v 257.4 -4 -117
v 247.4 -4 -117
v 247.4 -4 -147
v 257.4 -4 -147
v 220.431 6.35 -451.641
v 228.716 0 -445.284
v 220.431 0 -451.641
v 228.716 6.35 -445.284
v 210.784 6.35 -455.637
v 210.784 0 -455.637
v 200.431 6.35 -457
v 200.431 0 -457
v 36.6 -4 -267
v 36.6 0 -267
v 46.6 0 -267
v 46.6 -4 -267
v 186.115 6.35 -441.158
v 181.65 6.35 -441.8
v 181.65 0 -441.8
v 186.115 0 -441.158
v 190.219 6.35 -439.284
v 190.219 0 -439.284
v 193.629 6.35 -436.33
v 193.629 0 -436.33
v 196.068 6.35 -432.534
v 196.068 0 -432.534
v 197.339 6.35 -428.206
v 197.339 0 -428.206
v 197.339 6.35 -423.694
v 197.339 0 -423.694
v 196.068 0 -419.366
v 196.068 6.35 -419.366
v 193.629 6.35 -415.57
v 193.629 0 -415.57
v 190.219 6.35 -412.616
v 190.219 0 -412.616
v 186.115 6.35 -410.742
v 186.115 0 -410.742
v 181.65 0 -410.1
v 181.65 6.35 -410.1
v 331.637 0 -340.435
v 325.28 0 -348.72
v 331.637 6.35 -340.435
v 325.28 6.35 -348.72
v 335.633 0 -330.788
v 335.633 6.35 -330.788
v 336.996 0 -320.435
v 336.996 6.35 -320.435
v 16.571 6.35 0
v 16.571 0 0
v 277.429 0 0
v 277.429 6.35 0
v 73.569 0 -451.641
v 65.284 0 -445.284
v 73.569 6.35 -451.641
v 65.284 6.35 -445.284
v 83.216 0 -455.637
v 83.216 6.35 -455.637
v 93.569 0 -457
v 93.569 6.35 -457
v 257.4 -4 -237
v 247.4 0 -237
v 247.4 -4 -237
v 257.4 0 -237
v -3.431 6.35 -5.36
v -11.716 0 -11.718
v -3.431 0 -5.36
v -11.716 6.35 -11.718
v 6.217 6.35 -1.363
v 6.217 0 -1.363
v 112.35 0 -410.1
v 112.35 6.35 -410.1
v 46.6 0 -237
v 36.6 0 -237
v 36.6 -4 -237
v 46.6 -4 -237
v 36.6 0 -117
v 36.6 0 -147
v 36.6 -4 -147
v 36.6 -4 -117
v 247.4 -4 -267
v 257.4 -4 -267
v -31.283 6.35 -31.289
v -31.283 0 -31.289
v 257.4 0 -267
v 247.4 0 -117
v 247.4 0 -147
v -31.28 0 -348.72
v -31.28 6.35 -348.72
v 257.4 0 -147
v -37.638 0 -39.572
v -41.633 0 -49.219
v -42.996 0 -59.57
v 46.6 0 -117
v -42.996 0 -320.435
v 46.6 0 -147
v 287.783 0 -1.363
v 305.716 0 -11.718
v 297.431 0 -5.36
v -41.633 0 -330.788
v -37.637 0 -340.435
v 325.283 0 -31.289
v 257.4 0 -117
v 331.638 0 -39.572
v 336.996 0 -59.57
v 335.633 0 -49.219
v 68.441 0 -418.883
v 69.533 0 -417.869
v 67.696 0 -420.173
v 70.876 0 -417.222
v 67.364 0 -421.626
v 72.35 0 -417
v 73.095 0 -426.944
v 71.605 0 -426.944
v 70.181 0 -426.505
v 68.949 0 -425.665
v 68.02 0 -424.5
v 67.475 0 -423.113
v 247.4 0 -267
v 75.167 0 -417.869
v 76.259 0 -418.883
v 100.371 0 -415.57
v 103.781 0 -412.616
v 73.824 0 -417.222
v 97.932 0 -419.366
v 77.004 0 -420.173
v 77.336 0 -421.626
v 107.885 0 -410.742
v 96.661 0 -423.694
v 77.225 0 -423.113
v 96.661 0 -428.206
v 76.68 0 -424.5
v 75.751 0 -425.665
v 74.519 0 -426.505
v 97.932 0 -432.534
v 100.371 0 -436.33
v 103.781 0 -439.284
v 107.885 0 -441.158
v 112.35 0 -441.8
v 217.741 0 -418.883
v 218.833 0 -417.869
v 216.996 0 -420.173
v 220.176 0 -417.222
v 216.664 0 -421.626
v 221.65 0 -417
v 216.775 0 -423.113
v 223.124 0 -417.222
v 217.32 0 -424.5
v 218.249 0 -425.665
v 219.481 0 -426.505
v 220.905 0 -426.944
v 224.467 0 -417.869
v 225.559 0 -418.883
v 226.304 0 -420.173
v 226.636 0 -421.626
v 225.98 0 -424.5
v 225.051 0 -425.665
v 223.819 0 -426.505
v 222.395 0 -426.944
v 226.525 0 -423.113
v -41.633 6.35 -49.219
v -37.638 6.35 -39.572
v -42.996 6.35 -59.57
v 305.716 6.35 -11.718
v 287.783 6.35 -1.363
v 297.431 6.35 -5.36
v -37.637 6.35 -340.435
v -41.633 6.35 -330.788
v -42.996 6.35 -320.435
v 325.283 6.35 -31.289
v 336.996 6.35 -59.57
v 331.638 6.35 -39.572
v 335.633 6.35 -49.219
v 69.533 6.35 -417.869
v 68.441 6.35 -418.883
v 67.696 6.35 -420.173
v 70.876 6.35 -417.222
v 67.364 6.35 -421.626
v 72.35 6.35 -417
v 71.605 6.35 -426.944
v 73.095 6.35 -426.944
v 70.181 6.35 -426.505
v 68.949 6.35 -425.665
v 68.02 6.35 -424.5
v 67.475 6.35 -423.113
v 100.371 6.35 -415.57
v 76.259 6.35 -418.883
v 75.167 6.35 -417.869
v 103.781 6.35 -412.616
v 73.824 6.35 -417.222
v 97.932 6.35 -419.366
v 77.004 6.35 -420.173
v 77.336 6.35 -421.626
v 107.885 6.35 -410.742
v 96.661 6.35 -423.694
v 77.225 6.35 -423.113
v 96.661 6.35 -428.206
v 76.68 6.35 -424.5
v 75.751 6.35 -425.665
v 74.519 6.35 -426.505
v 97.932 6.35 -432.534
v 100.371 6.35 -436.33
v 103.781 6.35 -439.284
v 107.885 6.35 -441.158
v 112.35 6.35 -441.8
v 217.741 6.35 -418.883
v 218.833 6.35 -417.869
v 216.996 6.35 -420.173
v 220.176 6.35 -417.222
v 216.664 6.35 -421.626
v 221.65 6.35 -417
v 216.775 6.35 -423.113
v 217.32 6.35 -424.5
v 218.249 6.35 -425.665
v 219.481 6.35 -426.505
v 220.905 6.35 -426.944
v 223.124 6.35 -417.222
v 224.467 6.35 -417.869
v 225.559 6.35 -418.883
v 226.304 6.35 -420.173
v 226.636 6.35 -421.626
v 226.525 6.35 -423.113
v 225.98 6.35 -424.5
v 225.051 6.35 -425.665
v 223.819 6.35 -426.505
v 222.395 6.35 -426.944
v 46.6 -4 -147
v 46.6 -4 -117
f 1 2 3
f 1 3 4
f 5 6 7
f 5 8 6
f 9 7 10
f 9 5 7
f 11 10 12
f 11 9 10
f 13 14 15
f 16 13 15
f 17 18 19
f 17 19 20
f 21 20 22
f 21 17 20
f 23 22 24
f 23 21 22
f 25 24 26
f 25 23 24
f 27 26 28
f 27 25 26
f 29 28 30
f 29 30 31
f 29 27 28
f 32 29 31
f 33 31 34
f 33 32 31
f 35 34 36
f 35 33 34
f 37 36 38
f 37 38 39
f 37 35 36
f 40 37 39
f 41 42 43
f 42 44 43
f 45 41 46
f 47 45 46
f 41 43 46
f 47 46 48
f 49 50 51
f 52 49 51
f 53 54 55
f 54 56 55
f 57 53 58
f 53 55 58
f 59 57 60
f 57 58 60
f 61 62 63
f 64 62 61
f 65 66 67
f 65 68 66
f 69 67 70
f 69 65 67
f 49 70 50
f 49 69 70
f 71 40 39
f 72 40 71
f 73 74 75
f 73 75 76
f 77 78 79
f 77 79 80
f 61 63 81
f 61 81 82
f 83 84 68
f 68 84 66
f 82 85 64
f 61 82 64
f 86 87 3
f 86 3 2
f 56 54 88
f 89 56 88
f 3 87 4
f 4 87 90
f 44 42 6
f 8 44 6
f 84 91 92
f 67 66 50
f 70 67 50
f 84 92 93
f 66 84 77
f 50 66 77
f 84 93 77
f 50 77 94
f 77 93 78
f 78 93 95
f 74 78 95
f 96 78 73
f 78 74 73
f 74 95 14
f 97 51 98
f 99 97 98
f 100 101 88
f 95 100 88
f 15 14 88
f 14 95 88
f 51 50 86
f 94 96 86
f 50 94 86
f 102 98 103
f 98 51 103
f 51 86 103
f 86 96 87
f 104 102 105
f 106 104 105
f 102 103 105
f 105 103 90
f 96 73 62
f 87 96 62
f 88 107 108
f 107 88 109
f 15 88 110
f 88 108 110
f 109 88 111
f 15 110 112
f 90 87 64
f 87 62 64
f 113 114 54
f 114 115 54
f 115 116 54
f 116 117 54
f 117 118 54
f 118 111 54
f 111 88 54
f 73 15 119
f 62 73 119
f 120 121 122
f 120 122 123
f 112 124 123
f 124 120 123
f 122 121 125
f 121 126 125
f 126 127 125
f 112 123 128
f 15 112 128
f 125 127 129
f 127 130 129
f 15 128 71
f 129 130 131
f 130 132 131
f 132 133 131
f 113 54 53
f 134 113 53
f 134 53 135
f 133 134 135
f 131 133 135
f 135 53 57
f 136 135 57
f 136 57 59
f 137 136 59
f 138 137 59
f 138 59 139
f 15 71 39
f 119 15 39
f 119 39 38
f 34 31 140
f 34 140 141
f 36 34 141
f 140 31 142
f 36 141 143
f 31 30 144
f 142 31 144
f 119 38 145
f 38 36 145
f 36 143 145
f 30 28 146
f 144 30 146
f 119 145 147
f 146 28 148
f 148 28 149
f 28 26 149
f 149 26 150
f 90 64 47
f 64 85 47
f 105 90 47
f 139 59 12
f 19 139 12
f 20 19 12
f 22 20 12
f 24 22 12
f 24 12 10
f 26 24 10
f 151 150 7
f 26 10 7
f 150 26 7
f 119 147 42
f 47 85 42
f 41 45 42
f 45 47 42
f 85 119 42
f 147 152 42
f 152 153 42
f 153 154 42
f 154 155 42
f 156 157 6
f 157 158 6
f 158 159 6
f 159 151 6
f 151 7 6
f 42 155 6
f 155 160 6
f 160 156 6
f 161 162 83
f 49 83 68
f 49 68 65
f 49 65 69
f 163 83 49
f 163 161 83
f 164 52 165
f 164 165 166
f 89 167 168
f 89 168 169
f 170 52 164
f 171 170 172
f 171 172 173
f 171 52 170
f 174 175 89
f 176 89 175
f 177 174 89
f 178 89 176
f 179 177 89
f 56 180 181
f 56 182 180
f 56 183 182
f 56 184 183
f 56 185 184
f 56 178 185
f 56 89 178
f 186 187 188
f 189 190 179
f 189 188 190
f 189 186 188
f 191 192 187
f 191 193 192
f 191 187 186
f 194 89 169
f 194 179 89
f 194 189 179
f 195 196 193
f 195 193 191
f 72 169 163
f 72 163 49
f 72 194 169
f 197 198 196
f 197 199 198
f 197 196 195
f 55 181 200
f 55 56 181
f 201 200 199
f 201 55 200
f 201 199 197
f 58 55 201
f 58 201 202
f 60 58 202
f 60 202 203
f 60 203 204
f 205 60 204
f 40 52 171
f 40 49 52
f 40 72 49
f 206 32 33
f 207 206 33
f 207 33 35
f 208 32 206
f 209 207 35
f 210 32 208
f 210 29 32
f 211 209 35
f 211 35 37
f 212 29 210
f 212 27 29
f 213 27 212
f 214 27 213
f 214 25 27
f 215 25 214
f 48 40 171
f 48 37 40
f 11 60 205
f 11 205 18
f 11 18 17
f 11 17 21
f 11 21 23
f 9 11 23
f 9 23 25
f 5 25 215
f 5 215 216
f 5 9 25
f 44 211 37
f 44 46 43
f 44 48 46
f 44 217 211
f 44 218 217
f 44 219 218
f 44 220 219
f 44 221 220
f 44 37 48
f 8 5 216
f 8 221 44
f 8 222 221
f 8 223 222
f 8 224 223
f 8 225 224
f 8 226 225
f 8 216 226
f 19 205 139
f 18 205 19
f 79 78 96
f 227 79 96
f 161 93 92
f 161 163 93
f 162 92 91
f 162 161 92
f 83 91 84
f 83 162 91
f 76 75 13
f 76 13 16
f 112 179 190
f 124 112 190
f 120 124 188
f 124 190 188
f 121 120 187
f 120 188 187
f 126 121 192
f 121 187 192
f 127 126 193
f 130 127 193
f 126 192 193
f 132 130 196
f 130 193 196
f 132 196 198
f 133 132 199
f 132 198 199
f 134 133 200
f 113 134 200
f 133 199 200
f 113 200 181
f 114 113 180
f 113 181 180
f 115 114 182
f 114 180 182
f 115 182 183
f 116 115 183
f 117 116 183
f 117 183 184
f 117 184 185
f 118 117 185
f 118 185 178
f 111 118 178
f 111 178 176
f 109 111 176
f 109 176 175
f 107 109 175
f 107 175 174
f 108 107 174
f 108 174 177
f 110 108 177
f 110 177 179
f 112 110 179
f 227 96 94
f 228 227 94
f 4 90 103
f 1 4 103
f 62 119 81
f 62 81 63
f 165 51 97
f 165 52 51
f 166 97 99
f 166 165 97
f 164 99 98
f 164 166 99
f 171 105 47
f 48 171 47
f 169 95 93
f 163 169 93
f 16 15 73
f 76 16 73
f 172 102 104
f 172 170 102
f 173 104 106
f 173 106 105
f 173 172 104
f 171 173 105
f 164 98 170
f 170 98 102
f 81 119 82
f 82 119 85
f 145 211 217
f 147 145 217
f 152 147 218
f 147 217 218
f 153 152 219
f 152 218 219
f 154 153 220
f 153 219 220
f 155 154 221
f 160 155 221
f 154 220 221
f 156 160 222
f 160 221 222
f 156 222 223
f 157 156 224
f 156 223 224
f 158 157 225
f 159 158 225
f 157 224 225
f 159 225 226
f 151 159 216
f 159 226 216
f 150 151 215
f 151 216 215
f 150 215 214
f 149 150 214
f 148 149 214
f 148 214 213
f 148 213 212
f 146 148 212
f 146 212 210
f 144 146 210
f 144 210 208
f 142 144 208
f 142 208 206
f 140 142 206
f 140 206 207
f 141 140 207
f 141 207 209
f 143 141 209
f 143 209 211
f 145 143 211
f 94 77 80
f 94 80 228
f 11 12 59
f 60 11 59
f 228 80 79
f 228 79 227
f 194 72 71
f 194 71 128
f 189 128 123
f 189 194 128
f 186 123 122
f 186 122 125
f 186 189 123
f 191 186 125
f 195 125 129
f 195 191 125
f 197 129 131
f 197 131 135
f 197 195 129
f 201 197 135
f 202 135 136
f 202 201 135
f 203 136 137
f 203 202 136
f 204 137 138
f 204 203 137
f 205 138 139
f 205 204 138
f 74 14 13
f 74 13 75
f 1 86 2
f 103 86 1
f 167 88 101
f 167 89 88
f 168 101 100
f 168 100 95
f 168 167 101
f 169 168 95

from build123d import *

# Parameters (mm, degrees)
BODY_DEPTH                    = 6.35
HANDLE_DEPTH                  = 6.35
SKETCH11_R                    = 5
LOCKING_MECHANISM_HOLES_DEPTH = 6.36
FILLET1_R                     = 40
FILLET2_R                     = 40
SKETCH12_W                    = 10
SKETCH12_H                    = 30
BOSS_EXTRUDE1_DEPTH           = 4


with BuildPart() as part:
    # Sketch1 → Body (new body)
    with BuildSketch(Plane(origin=(0, 0, 0), x_dir=(1, 0, 0), z_dir=(0, 1, 0))):
        Polygon((0, 0), (294, 0), (336.996020767, 43.003978862), (336.996020767, 337.003978862), (217, 456.999999629), (77, 456.999999629), (-42.996020767, 337.003978862), (-42.996020767, 43.003978862), align=None)
    extrude(amount=BODY_DEPTH)

    # Sketch2 → Handle (cut)
    with BuildSketch(Plane(origin=(0, 6.35, 0), x_dir=(1, 0, 0), z_dir=(0, 1, 0))):
        with BuildLine():
            Line((112.35, 441.799999629), (181.65, 441.799999629))
            ThreePointArc((181.65, 441.799999629), (197.5, 425.949999629), (181.65, 410.099999629))
            Line((181.65, 410.099999629), (112.35, 410.099999629))
            ThreePointArc((112.35, 410.099999629), (96.5, 425.949999629), (112.35, 441.799999629))
        make_face()
    extrude(amount=-HANDLE_DEPTH, mode=Mode.SUBTRACT)

    # Sketch11 → Locking Mechanism Holes (cut)
    with BuildSketch(Plane(origin=(0, 6.35, 0), x_dir=(1, 0, 0), z_dir=(0, 1, 0))):
        with Locations(Location((221.65, 421.999999629, 0), (0, 0, 270))):
            Circle(SKETCH11_R)
        with Locations(Location((72.35, 421.999999629, 0), (0, 0, 270))):
            Circle(SKETCH11_R)
    extrude(amount=-LOCKING_MECHANISM_HOLES_DEPTH, mode=Mode.SUBTRACT)

    # Fillet1
    fillet1_edges = [part.edges().sort_by_distance(p)[0] for p in [
        (77, 3.175, -456.999999629),
        (217, 3.175, -456.999999629),
    ]]
    fillet(fillet1_edges, radius=FILLET1_R)

    # Fillet2
    fillet2_edges = [part.edges().sort_by_distance(p)[0] for p in [
        (-42.996020767, 3.175, -43.003978862),
        (-42.996020767, 3.175, -337.003978862),
        (336.996020767, 3.175, -337.003978862),
        (336.996020767, 3.175, -43.003978862),
        (294, 3.175, 0),
        (0, 3.175, 0),
    ]]
    fillet(fillet2_edges, radius=FILLET2_R)

    # Sketch12 → Boss-Extrude1 (add)
    with BuildSketch(Plane.XZ):
        with Locations((252.4, -251.999999629)):
            Rectangle(SKETCH12_W, SKETCH12_H)
        with Locations((41.6, -131.999999629)):
            Rectangle(SKETCH12_W, SKETCH12_H)
        with Locations((41.6, -251.999999629)):
            Rectangle(SKETCH12_W, SKETCH12_H)
        with Locations((252.4, -131.999999629)):
            Rectangle(SKETCH12_W, SKETCH12_H)
    extrude(amount=BOSS_EXTRUDE1_DEPTH)


solid = part.part
